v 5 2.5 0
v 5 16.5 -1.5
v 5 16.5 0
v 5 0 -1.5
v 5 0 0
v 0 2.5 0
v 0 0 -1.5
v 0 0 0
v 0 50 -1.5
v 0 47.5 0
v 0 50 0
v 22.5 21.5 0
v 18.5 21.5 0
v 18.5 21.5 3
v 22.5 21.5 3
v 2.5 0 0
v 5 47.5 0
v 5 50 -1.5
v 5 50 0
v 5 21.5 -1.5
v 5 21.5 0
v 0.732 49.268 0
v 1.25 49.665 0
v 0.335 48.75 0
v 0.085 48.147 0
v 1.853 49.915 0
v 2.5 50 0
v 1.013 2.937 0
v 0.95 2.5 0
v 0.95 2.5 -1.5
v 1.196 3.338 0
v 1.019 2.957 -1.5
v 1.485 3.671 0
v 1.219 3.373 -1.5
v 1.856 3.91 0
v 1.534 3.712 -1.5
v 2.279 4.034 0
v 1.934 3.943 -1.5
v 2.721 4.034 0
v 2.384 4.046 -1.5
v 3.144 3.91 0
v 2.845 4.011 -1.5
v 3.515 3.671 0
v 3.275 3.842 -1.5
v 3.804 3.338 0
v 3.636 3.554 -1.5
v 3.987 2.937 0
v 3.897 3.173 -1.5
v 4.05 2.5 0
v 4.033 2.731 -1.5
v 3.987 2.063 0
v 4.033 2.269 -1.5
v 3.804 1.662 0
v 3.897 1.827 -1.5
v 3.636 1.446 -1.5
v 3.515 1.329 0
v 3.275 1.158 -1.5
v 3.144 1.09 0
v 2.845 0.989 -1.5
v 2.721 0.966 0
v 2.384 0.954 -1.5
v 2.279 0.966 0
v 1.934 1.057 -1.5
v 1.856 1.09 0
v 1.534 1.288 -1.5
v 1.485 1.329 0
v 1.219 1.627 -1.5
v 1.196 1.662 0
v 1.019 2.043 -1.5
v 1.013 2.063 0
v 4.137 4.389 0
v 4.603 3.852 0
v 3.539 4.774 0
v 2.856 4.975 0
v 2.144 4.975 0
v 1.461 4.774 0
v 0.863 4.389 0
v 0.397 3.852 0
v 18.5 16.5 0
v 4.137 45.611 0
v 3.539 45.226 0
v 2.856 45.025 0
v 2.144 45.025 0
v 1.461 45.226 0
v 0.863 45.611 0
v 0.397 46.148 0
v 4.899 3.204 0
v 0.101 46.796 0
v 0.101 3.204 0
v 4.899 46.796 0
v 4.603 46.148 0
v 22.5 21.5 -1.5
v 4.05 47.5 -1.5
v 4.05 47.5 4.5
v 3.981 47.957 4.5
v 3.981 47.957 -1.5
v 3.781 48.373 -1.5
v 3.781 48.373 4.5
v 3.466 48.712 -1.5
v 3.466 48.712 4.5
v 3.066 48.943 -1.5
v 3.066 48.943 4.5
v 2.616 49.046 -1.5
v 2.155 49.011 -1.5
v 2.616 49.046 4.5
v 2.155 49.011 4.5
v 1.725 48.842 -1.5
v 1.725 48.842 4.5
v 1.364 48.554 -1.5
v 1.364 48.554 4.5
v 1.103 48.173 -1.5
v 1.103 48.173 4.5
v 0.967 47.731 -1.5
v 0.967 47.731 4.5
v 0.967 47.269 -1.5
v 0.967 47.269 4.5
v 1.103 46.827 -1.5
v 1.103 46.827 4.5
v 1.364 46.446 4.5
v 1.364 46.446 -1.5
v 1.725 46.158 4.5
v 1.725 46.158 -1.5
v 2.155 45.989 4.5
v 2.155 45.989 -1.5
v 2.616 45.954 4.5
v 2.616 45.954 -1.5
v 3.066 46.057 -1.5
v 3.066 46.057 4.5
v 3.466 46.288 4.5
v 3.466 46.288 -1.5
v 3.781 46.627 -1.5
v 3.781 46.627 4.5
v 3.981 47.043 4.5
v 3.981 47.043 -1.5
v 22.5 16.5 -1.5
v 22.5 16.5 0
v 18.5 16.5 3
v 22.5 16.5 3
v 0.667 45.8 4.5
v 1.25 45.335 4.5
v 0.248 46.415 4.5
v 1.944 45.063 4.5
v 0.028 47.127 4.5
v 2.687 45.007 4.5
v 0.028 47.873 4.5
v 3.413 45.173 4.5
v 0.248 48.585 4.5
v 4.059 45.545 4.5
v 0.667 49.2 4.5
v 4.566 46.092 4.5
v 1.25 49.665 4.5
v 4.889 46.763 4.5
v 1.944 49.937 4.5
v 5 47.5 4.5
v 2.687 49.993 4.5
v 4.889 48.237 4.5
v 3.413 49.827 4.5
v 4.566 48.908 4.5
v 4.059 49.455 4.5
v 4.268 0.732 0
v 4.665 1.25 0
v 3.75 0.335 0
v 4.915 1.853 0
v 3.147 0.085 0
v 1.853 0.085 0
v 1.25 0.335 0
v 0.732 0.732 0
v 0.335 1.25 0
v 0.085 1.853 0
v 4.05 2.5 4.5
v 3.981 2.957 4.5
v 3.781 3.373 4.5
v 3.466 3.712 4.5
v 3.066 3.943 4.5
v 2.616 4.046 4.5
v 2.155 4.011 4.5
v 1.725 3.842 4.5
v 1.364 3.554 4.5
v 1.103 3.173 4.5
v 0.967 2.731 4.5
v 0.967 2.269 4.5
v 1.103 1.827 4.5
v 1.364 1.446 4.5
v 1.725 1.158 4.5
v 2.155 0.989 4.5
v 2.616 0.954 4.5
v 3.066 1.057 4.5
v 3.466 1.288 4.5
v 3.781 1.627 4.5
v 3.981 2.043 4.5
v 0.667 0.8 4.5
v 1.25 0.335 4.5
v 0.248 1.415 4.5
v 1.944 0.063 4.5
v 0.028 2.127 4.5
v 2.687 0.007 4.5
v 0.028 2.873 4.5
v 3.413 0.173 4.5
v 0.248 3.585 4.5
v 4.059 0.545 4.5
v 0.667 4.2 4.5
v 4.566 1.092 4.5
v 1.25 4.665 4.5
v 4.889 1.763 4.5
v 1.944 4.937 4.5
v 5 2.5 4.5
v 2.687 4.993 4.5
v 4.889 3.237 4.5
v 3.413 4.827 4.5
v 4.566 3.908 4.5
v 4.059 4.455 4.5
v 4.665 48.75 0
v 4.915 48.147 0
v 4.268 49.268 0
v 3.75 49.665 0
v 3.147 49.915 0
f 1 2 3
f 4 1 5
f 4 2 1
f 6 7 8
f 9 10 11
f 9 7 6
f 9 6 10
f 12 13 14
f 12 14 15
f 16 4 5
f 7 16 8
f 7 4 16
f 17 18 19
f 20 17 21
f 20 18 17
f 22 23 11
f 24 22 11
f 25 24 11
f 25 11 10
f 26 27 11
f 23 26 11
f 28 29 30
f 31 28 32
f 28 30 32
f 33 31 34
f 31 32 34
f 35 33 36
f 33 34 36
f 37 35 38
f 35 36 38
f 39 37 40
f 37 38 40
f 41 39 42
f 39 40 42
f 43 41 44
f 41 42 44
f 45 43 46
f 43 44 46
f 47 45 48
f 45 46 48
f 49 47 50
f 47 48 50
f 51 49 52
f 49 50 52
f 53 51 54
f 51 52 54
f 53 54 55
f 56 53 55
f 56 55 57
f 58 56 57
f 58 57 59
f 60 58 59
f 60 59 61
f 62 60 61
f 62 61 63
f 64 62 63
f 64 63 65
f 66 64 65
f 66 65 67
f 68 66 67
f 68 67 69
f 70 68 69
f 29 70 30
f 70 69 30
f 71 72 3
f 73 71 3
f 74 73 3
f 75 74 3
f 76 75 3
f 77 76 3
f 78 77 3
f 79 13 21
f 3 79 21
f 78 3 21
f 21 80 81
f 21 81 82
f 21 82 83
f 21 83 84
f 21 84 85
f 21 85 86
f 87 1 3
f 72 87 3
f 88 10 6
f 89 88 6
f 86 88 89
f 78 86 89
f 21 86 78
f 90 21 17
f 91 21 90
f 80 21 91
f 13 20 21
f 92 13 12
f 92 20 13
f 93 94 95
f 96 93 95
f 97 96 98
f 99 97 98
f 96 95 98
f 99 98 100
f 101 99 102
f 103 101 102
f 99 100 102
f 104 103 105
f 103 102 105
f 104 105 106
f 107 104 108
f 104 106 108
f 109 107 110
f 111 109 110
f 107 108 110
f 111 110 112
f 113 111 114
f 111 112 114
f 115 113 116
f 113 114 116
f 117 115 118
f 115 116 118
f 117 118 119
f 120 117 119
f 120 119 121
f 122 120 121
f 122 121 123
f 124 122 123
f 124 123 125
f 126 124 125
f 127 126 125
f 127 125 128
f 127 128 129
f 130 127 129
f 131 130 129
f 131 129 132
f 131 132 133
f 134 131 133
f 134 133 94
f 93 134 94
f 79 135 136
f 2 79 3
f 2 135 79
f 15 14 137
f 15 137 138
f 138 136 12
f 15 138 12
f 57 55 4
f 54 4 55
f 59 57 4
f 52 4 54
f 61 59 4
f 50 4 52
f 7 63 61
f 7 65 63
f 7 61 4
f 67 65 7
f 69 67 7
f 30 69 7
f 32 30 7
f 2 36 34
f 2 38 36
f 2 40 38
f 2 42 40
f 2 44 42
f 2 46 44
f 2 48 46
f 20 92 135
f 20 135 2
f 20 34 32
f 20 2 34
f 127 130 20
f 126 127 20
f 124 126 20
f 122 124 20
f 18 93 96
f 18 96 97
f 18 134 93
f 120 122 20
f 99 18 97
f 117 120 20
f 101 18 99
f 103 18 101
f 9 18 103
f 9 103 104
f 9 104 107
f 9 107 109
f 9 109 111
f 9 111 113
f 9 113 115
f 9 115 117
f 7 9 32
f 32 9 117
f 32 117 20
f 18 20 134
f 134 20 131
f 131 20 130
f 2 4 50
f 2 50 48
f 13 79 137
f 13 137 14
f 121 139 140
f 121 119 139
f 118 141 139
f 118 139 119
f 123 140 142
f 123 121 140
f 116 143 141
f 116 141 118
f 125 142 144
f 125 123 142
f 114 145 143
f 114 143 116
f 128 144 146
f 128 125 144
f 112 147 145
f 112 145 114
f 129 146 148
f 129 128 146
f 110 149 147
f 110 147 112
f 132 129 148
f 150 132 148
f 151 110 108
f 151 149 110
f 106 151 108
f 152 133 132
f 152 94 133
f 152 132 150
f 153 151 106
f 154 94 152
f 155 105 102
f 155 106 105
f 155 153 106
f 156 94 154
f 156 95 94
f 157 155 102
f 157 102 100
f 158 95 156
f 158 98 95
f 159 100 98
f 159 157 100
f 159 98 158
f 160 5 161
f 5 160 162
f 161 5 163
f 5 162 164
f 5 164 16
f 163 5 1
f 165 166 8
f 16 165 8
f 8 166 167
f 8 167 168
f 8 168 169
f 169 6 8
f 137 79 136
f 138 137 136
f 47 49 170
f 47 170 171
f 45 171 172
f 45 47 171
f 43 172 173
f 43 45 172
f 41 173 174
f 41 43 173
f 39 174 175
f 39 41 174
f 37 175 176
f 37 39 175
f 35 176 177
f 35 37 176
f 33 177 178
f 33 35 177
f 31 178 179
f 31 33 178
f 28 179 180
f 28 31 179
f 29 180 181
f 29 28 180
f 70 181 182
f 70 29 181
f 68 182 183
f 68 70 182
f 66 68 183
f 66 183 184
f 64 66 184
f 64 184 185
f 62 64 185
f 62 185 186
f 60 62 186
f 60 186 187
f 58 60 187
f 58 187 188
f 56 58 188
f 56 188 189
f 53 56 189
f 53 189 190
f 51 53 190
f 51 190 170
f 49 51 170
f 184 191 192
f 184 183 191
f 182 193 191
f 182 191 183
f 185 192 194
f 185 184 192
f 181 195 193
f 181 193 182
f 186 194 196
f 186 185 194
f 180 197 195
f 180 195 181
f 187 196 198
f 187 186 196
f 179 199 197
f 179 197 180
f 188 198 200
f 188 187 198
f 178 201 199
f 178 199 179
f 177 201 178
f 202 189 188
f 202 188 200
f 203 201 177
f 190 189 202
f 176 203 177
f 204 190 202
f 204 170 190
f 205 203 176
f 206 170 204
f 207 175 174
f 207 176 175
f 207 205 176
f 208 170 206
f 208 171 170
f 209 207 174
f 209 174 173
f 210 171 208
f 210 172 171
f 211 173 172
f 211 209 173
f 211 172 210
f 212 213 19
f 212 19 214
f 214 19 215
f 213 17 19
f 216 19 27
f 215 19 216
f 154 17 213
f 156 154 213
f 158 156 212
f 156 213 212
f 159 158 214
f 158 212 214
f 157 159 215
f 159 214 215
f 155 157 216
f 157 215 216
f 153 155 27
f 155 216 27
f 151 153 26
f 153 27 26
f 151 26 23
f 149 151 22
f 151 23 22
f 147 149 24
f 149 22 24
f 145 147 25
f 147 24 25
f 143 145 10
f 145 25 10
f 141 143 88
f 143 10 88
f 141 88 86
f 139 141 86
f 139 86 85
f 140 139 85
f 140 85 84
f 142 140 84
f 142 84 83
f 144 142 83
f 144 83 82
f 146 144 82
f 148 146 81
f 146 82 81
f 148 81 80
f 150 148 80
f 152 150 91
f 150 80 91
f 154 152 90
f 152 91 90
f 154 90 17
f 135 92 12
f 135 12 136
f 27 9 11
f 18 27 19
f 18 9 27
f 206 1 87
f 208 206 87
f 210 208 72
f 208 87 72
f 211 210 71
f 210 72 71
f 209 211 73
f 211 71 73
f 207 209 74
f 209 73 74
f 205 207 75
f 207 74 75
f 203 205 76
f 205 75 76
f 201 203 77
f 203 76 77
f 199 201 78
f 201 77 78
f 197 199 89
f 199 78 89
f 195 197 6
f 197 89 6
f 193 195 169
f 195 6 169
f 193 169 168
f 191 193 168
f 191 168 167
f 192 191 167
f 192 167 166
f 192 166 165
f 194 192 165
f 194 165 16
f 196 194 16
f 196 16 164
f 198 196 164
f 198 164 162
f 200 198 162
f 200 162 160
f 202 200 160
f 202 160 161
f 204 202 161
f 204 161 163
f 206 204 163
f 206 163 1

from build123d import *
from build123d.topology import SkipClean

# Parameters (mm, degrees)
SKETCH1_R           = 2.5
SKETCH1_R_2         = 1.55
BOSS_EXTRUDE1_DEPTH = 4.5
BOSS_EXTRUDE2_START = 1.5
SKETCH2_R           = 1.55
BOSS_EXTRUDE2_DEPTH = 1.5
SKETCH3_W           = 4
SKETCH3_H           = 5
BOSS_EXTRUDE3_DEPTH = 3
SKETCH4_R           = 2.5
BOSS_EXTRUDE4_DEPTH = 4.5
SKETCH5_R           = 1.55
CUT_EXTRUDE1_DEPTH  = 10.5


with BuildPart() as part:
    # Sketch1 → Boss-Extrude1 (new body)
    with BuildSketch(Plane.XY):
        with Locations((2.5, 2.5)):
            Circle(SKETCH1_R)
        with Locations((2.5, 2.5)):
            Circle(SKETCH1_R_2, mode=Mode.SUBTRACT)
    extrude(amount=BOSS_EXTRUDE1_DEPTH)

    # Sketch2 → Boss-Extrude2 (add)
    with SkipClean():  # the faces are left unmerged after this step: merging them gives an invalid solid
        with BuildSketch(Plane(origin=(0, 0, 0), x_dir=(-1, 0, 0), z_dir=(0, 0, -1)).offset(BOSS_EXTRUDE2_START)):
            Polygon((-5, 0), (0, 0), (0, 50), (-5, 50), (-5, 21.5), (-22.5, 21.5), (-22.5, 16.5), (-5, 16.5), align=None)
            with Locations((-2.5, 2.5)):
                Circle(SKETCH2_R, mode=Mode.SUBTRACT)
        extrude(amount=-BOSS_EXTRUDE2_DEPTH)

    # Sketch3 → Boss-Extrude3 (add)
    with SkipClean():  # the faces are left unmerged after this step: merging them gives an invalid solid
        with BuildSketch(Plane.XY):
            with Locations((20.5, 19)):
                Rectangle(SKETCH3_W, SKETCH3_H)
        extrude(amount=BOSS_EXTRUDE3_DEPTH)

    # Sketch4 → Boss-Extrude4 (add)
    with SkipClean():  # the faces are left unmerged after this step: merging them gives an invalid solid
        with BuildSketch(Plane.XY):
            with Locations((2.5, 47.5)):
                Circle(SKETCH4_R)
        extrude(amount=BOSS_EXTRUDE4_DEPTH)

    # Sketch5 → Cut-Extrude1 (cut)
    with SkipClean():  # the faces are left unmerged after this step: merging them gives an invalid solid
        with BuildSketch(Plane.XY.offset(4.5)):
            with Locations((2.5, 47.5)):
                Circle(SKETCH5_R)
        extrude(amount=-CUT_EXTRUDE1_DEPTH, mode=Mode.SUBTRACT)


solid = part.part
